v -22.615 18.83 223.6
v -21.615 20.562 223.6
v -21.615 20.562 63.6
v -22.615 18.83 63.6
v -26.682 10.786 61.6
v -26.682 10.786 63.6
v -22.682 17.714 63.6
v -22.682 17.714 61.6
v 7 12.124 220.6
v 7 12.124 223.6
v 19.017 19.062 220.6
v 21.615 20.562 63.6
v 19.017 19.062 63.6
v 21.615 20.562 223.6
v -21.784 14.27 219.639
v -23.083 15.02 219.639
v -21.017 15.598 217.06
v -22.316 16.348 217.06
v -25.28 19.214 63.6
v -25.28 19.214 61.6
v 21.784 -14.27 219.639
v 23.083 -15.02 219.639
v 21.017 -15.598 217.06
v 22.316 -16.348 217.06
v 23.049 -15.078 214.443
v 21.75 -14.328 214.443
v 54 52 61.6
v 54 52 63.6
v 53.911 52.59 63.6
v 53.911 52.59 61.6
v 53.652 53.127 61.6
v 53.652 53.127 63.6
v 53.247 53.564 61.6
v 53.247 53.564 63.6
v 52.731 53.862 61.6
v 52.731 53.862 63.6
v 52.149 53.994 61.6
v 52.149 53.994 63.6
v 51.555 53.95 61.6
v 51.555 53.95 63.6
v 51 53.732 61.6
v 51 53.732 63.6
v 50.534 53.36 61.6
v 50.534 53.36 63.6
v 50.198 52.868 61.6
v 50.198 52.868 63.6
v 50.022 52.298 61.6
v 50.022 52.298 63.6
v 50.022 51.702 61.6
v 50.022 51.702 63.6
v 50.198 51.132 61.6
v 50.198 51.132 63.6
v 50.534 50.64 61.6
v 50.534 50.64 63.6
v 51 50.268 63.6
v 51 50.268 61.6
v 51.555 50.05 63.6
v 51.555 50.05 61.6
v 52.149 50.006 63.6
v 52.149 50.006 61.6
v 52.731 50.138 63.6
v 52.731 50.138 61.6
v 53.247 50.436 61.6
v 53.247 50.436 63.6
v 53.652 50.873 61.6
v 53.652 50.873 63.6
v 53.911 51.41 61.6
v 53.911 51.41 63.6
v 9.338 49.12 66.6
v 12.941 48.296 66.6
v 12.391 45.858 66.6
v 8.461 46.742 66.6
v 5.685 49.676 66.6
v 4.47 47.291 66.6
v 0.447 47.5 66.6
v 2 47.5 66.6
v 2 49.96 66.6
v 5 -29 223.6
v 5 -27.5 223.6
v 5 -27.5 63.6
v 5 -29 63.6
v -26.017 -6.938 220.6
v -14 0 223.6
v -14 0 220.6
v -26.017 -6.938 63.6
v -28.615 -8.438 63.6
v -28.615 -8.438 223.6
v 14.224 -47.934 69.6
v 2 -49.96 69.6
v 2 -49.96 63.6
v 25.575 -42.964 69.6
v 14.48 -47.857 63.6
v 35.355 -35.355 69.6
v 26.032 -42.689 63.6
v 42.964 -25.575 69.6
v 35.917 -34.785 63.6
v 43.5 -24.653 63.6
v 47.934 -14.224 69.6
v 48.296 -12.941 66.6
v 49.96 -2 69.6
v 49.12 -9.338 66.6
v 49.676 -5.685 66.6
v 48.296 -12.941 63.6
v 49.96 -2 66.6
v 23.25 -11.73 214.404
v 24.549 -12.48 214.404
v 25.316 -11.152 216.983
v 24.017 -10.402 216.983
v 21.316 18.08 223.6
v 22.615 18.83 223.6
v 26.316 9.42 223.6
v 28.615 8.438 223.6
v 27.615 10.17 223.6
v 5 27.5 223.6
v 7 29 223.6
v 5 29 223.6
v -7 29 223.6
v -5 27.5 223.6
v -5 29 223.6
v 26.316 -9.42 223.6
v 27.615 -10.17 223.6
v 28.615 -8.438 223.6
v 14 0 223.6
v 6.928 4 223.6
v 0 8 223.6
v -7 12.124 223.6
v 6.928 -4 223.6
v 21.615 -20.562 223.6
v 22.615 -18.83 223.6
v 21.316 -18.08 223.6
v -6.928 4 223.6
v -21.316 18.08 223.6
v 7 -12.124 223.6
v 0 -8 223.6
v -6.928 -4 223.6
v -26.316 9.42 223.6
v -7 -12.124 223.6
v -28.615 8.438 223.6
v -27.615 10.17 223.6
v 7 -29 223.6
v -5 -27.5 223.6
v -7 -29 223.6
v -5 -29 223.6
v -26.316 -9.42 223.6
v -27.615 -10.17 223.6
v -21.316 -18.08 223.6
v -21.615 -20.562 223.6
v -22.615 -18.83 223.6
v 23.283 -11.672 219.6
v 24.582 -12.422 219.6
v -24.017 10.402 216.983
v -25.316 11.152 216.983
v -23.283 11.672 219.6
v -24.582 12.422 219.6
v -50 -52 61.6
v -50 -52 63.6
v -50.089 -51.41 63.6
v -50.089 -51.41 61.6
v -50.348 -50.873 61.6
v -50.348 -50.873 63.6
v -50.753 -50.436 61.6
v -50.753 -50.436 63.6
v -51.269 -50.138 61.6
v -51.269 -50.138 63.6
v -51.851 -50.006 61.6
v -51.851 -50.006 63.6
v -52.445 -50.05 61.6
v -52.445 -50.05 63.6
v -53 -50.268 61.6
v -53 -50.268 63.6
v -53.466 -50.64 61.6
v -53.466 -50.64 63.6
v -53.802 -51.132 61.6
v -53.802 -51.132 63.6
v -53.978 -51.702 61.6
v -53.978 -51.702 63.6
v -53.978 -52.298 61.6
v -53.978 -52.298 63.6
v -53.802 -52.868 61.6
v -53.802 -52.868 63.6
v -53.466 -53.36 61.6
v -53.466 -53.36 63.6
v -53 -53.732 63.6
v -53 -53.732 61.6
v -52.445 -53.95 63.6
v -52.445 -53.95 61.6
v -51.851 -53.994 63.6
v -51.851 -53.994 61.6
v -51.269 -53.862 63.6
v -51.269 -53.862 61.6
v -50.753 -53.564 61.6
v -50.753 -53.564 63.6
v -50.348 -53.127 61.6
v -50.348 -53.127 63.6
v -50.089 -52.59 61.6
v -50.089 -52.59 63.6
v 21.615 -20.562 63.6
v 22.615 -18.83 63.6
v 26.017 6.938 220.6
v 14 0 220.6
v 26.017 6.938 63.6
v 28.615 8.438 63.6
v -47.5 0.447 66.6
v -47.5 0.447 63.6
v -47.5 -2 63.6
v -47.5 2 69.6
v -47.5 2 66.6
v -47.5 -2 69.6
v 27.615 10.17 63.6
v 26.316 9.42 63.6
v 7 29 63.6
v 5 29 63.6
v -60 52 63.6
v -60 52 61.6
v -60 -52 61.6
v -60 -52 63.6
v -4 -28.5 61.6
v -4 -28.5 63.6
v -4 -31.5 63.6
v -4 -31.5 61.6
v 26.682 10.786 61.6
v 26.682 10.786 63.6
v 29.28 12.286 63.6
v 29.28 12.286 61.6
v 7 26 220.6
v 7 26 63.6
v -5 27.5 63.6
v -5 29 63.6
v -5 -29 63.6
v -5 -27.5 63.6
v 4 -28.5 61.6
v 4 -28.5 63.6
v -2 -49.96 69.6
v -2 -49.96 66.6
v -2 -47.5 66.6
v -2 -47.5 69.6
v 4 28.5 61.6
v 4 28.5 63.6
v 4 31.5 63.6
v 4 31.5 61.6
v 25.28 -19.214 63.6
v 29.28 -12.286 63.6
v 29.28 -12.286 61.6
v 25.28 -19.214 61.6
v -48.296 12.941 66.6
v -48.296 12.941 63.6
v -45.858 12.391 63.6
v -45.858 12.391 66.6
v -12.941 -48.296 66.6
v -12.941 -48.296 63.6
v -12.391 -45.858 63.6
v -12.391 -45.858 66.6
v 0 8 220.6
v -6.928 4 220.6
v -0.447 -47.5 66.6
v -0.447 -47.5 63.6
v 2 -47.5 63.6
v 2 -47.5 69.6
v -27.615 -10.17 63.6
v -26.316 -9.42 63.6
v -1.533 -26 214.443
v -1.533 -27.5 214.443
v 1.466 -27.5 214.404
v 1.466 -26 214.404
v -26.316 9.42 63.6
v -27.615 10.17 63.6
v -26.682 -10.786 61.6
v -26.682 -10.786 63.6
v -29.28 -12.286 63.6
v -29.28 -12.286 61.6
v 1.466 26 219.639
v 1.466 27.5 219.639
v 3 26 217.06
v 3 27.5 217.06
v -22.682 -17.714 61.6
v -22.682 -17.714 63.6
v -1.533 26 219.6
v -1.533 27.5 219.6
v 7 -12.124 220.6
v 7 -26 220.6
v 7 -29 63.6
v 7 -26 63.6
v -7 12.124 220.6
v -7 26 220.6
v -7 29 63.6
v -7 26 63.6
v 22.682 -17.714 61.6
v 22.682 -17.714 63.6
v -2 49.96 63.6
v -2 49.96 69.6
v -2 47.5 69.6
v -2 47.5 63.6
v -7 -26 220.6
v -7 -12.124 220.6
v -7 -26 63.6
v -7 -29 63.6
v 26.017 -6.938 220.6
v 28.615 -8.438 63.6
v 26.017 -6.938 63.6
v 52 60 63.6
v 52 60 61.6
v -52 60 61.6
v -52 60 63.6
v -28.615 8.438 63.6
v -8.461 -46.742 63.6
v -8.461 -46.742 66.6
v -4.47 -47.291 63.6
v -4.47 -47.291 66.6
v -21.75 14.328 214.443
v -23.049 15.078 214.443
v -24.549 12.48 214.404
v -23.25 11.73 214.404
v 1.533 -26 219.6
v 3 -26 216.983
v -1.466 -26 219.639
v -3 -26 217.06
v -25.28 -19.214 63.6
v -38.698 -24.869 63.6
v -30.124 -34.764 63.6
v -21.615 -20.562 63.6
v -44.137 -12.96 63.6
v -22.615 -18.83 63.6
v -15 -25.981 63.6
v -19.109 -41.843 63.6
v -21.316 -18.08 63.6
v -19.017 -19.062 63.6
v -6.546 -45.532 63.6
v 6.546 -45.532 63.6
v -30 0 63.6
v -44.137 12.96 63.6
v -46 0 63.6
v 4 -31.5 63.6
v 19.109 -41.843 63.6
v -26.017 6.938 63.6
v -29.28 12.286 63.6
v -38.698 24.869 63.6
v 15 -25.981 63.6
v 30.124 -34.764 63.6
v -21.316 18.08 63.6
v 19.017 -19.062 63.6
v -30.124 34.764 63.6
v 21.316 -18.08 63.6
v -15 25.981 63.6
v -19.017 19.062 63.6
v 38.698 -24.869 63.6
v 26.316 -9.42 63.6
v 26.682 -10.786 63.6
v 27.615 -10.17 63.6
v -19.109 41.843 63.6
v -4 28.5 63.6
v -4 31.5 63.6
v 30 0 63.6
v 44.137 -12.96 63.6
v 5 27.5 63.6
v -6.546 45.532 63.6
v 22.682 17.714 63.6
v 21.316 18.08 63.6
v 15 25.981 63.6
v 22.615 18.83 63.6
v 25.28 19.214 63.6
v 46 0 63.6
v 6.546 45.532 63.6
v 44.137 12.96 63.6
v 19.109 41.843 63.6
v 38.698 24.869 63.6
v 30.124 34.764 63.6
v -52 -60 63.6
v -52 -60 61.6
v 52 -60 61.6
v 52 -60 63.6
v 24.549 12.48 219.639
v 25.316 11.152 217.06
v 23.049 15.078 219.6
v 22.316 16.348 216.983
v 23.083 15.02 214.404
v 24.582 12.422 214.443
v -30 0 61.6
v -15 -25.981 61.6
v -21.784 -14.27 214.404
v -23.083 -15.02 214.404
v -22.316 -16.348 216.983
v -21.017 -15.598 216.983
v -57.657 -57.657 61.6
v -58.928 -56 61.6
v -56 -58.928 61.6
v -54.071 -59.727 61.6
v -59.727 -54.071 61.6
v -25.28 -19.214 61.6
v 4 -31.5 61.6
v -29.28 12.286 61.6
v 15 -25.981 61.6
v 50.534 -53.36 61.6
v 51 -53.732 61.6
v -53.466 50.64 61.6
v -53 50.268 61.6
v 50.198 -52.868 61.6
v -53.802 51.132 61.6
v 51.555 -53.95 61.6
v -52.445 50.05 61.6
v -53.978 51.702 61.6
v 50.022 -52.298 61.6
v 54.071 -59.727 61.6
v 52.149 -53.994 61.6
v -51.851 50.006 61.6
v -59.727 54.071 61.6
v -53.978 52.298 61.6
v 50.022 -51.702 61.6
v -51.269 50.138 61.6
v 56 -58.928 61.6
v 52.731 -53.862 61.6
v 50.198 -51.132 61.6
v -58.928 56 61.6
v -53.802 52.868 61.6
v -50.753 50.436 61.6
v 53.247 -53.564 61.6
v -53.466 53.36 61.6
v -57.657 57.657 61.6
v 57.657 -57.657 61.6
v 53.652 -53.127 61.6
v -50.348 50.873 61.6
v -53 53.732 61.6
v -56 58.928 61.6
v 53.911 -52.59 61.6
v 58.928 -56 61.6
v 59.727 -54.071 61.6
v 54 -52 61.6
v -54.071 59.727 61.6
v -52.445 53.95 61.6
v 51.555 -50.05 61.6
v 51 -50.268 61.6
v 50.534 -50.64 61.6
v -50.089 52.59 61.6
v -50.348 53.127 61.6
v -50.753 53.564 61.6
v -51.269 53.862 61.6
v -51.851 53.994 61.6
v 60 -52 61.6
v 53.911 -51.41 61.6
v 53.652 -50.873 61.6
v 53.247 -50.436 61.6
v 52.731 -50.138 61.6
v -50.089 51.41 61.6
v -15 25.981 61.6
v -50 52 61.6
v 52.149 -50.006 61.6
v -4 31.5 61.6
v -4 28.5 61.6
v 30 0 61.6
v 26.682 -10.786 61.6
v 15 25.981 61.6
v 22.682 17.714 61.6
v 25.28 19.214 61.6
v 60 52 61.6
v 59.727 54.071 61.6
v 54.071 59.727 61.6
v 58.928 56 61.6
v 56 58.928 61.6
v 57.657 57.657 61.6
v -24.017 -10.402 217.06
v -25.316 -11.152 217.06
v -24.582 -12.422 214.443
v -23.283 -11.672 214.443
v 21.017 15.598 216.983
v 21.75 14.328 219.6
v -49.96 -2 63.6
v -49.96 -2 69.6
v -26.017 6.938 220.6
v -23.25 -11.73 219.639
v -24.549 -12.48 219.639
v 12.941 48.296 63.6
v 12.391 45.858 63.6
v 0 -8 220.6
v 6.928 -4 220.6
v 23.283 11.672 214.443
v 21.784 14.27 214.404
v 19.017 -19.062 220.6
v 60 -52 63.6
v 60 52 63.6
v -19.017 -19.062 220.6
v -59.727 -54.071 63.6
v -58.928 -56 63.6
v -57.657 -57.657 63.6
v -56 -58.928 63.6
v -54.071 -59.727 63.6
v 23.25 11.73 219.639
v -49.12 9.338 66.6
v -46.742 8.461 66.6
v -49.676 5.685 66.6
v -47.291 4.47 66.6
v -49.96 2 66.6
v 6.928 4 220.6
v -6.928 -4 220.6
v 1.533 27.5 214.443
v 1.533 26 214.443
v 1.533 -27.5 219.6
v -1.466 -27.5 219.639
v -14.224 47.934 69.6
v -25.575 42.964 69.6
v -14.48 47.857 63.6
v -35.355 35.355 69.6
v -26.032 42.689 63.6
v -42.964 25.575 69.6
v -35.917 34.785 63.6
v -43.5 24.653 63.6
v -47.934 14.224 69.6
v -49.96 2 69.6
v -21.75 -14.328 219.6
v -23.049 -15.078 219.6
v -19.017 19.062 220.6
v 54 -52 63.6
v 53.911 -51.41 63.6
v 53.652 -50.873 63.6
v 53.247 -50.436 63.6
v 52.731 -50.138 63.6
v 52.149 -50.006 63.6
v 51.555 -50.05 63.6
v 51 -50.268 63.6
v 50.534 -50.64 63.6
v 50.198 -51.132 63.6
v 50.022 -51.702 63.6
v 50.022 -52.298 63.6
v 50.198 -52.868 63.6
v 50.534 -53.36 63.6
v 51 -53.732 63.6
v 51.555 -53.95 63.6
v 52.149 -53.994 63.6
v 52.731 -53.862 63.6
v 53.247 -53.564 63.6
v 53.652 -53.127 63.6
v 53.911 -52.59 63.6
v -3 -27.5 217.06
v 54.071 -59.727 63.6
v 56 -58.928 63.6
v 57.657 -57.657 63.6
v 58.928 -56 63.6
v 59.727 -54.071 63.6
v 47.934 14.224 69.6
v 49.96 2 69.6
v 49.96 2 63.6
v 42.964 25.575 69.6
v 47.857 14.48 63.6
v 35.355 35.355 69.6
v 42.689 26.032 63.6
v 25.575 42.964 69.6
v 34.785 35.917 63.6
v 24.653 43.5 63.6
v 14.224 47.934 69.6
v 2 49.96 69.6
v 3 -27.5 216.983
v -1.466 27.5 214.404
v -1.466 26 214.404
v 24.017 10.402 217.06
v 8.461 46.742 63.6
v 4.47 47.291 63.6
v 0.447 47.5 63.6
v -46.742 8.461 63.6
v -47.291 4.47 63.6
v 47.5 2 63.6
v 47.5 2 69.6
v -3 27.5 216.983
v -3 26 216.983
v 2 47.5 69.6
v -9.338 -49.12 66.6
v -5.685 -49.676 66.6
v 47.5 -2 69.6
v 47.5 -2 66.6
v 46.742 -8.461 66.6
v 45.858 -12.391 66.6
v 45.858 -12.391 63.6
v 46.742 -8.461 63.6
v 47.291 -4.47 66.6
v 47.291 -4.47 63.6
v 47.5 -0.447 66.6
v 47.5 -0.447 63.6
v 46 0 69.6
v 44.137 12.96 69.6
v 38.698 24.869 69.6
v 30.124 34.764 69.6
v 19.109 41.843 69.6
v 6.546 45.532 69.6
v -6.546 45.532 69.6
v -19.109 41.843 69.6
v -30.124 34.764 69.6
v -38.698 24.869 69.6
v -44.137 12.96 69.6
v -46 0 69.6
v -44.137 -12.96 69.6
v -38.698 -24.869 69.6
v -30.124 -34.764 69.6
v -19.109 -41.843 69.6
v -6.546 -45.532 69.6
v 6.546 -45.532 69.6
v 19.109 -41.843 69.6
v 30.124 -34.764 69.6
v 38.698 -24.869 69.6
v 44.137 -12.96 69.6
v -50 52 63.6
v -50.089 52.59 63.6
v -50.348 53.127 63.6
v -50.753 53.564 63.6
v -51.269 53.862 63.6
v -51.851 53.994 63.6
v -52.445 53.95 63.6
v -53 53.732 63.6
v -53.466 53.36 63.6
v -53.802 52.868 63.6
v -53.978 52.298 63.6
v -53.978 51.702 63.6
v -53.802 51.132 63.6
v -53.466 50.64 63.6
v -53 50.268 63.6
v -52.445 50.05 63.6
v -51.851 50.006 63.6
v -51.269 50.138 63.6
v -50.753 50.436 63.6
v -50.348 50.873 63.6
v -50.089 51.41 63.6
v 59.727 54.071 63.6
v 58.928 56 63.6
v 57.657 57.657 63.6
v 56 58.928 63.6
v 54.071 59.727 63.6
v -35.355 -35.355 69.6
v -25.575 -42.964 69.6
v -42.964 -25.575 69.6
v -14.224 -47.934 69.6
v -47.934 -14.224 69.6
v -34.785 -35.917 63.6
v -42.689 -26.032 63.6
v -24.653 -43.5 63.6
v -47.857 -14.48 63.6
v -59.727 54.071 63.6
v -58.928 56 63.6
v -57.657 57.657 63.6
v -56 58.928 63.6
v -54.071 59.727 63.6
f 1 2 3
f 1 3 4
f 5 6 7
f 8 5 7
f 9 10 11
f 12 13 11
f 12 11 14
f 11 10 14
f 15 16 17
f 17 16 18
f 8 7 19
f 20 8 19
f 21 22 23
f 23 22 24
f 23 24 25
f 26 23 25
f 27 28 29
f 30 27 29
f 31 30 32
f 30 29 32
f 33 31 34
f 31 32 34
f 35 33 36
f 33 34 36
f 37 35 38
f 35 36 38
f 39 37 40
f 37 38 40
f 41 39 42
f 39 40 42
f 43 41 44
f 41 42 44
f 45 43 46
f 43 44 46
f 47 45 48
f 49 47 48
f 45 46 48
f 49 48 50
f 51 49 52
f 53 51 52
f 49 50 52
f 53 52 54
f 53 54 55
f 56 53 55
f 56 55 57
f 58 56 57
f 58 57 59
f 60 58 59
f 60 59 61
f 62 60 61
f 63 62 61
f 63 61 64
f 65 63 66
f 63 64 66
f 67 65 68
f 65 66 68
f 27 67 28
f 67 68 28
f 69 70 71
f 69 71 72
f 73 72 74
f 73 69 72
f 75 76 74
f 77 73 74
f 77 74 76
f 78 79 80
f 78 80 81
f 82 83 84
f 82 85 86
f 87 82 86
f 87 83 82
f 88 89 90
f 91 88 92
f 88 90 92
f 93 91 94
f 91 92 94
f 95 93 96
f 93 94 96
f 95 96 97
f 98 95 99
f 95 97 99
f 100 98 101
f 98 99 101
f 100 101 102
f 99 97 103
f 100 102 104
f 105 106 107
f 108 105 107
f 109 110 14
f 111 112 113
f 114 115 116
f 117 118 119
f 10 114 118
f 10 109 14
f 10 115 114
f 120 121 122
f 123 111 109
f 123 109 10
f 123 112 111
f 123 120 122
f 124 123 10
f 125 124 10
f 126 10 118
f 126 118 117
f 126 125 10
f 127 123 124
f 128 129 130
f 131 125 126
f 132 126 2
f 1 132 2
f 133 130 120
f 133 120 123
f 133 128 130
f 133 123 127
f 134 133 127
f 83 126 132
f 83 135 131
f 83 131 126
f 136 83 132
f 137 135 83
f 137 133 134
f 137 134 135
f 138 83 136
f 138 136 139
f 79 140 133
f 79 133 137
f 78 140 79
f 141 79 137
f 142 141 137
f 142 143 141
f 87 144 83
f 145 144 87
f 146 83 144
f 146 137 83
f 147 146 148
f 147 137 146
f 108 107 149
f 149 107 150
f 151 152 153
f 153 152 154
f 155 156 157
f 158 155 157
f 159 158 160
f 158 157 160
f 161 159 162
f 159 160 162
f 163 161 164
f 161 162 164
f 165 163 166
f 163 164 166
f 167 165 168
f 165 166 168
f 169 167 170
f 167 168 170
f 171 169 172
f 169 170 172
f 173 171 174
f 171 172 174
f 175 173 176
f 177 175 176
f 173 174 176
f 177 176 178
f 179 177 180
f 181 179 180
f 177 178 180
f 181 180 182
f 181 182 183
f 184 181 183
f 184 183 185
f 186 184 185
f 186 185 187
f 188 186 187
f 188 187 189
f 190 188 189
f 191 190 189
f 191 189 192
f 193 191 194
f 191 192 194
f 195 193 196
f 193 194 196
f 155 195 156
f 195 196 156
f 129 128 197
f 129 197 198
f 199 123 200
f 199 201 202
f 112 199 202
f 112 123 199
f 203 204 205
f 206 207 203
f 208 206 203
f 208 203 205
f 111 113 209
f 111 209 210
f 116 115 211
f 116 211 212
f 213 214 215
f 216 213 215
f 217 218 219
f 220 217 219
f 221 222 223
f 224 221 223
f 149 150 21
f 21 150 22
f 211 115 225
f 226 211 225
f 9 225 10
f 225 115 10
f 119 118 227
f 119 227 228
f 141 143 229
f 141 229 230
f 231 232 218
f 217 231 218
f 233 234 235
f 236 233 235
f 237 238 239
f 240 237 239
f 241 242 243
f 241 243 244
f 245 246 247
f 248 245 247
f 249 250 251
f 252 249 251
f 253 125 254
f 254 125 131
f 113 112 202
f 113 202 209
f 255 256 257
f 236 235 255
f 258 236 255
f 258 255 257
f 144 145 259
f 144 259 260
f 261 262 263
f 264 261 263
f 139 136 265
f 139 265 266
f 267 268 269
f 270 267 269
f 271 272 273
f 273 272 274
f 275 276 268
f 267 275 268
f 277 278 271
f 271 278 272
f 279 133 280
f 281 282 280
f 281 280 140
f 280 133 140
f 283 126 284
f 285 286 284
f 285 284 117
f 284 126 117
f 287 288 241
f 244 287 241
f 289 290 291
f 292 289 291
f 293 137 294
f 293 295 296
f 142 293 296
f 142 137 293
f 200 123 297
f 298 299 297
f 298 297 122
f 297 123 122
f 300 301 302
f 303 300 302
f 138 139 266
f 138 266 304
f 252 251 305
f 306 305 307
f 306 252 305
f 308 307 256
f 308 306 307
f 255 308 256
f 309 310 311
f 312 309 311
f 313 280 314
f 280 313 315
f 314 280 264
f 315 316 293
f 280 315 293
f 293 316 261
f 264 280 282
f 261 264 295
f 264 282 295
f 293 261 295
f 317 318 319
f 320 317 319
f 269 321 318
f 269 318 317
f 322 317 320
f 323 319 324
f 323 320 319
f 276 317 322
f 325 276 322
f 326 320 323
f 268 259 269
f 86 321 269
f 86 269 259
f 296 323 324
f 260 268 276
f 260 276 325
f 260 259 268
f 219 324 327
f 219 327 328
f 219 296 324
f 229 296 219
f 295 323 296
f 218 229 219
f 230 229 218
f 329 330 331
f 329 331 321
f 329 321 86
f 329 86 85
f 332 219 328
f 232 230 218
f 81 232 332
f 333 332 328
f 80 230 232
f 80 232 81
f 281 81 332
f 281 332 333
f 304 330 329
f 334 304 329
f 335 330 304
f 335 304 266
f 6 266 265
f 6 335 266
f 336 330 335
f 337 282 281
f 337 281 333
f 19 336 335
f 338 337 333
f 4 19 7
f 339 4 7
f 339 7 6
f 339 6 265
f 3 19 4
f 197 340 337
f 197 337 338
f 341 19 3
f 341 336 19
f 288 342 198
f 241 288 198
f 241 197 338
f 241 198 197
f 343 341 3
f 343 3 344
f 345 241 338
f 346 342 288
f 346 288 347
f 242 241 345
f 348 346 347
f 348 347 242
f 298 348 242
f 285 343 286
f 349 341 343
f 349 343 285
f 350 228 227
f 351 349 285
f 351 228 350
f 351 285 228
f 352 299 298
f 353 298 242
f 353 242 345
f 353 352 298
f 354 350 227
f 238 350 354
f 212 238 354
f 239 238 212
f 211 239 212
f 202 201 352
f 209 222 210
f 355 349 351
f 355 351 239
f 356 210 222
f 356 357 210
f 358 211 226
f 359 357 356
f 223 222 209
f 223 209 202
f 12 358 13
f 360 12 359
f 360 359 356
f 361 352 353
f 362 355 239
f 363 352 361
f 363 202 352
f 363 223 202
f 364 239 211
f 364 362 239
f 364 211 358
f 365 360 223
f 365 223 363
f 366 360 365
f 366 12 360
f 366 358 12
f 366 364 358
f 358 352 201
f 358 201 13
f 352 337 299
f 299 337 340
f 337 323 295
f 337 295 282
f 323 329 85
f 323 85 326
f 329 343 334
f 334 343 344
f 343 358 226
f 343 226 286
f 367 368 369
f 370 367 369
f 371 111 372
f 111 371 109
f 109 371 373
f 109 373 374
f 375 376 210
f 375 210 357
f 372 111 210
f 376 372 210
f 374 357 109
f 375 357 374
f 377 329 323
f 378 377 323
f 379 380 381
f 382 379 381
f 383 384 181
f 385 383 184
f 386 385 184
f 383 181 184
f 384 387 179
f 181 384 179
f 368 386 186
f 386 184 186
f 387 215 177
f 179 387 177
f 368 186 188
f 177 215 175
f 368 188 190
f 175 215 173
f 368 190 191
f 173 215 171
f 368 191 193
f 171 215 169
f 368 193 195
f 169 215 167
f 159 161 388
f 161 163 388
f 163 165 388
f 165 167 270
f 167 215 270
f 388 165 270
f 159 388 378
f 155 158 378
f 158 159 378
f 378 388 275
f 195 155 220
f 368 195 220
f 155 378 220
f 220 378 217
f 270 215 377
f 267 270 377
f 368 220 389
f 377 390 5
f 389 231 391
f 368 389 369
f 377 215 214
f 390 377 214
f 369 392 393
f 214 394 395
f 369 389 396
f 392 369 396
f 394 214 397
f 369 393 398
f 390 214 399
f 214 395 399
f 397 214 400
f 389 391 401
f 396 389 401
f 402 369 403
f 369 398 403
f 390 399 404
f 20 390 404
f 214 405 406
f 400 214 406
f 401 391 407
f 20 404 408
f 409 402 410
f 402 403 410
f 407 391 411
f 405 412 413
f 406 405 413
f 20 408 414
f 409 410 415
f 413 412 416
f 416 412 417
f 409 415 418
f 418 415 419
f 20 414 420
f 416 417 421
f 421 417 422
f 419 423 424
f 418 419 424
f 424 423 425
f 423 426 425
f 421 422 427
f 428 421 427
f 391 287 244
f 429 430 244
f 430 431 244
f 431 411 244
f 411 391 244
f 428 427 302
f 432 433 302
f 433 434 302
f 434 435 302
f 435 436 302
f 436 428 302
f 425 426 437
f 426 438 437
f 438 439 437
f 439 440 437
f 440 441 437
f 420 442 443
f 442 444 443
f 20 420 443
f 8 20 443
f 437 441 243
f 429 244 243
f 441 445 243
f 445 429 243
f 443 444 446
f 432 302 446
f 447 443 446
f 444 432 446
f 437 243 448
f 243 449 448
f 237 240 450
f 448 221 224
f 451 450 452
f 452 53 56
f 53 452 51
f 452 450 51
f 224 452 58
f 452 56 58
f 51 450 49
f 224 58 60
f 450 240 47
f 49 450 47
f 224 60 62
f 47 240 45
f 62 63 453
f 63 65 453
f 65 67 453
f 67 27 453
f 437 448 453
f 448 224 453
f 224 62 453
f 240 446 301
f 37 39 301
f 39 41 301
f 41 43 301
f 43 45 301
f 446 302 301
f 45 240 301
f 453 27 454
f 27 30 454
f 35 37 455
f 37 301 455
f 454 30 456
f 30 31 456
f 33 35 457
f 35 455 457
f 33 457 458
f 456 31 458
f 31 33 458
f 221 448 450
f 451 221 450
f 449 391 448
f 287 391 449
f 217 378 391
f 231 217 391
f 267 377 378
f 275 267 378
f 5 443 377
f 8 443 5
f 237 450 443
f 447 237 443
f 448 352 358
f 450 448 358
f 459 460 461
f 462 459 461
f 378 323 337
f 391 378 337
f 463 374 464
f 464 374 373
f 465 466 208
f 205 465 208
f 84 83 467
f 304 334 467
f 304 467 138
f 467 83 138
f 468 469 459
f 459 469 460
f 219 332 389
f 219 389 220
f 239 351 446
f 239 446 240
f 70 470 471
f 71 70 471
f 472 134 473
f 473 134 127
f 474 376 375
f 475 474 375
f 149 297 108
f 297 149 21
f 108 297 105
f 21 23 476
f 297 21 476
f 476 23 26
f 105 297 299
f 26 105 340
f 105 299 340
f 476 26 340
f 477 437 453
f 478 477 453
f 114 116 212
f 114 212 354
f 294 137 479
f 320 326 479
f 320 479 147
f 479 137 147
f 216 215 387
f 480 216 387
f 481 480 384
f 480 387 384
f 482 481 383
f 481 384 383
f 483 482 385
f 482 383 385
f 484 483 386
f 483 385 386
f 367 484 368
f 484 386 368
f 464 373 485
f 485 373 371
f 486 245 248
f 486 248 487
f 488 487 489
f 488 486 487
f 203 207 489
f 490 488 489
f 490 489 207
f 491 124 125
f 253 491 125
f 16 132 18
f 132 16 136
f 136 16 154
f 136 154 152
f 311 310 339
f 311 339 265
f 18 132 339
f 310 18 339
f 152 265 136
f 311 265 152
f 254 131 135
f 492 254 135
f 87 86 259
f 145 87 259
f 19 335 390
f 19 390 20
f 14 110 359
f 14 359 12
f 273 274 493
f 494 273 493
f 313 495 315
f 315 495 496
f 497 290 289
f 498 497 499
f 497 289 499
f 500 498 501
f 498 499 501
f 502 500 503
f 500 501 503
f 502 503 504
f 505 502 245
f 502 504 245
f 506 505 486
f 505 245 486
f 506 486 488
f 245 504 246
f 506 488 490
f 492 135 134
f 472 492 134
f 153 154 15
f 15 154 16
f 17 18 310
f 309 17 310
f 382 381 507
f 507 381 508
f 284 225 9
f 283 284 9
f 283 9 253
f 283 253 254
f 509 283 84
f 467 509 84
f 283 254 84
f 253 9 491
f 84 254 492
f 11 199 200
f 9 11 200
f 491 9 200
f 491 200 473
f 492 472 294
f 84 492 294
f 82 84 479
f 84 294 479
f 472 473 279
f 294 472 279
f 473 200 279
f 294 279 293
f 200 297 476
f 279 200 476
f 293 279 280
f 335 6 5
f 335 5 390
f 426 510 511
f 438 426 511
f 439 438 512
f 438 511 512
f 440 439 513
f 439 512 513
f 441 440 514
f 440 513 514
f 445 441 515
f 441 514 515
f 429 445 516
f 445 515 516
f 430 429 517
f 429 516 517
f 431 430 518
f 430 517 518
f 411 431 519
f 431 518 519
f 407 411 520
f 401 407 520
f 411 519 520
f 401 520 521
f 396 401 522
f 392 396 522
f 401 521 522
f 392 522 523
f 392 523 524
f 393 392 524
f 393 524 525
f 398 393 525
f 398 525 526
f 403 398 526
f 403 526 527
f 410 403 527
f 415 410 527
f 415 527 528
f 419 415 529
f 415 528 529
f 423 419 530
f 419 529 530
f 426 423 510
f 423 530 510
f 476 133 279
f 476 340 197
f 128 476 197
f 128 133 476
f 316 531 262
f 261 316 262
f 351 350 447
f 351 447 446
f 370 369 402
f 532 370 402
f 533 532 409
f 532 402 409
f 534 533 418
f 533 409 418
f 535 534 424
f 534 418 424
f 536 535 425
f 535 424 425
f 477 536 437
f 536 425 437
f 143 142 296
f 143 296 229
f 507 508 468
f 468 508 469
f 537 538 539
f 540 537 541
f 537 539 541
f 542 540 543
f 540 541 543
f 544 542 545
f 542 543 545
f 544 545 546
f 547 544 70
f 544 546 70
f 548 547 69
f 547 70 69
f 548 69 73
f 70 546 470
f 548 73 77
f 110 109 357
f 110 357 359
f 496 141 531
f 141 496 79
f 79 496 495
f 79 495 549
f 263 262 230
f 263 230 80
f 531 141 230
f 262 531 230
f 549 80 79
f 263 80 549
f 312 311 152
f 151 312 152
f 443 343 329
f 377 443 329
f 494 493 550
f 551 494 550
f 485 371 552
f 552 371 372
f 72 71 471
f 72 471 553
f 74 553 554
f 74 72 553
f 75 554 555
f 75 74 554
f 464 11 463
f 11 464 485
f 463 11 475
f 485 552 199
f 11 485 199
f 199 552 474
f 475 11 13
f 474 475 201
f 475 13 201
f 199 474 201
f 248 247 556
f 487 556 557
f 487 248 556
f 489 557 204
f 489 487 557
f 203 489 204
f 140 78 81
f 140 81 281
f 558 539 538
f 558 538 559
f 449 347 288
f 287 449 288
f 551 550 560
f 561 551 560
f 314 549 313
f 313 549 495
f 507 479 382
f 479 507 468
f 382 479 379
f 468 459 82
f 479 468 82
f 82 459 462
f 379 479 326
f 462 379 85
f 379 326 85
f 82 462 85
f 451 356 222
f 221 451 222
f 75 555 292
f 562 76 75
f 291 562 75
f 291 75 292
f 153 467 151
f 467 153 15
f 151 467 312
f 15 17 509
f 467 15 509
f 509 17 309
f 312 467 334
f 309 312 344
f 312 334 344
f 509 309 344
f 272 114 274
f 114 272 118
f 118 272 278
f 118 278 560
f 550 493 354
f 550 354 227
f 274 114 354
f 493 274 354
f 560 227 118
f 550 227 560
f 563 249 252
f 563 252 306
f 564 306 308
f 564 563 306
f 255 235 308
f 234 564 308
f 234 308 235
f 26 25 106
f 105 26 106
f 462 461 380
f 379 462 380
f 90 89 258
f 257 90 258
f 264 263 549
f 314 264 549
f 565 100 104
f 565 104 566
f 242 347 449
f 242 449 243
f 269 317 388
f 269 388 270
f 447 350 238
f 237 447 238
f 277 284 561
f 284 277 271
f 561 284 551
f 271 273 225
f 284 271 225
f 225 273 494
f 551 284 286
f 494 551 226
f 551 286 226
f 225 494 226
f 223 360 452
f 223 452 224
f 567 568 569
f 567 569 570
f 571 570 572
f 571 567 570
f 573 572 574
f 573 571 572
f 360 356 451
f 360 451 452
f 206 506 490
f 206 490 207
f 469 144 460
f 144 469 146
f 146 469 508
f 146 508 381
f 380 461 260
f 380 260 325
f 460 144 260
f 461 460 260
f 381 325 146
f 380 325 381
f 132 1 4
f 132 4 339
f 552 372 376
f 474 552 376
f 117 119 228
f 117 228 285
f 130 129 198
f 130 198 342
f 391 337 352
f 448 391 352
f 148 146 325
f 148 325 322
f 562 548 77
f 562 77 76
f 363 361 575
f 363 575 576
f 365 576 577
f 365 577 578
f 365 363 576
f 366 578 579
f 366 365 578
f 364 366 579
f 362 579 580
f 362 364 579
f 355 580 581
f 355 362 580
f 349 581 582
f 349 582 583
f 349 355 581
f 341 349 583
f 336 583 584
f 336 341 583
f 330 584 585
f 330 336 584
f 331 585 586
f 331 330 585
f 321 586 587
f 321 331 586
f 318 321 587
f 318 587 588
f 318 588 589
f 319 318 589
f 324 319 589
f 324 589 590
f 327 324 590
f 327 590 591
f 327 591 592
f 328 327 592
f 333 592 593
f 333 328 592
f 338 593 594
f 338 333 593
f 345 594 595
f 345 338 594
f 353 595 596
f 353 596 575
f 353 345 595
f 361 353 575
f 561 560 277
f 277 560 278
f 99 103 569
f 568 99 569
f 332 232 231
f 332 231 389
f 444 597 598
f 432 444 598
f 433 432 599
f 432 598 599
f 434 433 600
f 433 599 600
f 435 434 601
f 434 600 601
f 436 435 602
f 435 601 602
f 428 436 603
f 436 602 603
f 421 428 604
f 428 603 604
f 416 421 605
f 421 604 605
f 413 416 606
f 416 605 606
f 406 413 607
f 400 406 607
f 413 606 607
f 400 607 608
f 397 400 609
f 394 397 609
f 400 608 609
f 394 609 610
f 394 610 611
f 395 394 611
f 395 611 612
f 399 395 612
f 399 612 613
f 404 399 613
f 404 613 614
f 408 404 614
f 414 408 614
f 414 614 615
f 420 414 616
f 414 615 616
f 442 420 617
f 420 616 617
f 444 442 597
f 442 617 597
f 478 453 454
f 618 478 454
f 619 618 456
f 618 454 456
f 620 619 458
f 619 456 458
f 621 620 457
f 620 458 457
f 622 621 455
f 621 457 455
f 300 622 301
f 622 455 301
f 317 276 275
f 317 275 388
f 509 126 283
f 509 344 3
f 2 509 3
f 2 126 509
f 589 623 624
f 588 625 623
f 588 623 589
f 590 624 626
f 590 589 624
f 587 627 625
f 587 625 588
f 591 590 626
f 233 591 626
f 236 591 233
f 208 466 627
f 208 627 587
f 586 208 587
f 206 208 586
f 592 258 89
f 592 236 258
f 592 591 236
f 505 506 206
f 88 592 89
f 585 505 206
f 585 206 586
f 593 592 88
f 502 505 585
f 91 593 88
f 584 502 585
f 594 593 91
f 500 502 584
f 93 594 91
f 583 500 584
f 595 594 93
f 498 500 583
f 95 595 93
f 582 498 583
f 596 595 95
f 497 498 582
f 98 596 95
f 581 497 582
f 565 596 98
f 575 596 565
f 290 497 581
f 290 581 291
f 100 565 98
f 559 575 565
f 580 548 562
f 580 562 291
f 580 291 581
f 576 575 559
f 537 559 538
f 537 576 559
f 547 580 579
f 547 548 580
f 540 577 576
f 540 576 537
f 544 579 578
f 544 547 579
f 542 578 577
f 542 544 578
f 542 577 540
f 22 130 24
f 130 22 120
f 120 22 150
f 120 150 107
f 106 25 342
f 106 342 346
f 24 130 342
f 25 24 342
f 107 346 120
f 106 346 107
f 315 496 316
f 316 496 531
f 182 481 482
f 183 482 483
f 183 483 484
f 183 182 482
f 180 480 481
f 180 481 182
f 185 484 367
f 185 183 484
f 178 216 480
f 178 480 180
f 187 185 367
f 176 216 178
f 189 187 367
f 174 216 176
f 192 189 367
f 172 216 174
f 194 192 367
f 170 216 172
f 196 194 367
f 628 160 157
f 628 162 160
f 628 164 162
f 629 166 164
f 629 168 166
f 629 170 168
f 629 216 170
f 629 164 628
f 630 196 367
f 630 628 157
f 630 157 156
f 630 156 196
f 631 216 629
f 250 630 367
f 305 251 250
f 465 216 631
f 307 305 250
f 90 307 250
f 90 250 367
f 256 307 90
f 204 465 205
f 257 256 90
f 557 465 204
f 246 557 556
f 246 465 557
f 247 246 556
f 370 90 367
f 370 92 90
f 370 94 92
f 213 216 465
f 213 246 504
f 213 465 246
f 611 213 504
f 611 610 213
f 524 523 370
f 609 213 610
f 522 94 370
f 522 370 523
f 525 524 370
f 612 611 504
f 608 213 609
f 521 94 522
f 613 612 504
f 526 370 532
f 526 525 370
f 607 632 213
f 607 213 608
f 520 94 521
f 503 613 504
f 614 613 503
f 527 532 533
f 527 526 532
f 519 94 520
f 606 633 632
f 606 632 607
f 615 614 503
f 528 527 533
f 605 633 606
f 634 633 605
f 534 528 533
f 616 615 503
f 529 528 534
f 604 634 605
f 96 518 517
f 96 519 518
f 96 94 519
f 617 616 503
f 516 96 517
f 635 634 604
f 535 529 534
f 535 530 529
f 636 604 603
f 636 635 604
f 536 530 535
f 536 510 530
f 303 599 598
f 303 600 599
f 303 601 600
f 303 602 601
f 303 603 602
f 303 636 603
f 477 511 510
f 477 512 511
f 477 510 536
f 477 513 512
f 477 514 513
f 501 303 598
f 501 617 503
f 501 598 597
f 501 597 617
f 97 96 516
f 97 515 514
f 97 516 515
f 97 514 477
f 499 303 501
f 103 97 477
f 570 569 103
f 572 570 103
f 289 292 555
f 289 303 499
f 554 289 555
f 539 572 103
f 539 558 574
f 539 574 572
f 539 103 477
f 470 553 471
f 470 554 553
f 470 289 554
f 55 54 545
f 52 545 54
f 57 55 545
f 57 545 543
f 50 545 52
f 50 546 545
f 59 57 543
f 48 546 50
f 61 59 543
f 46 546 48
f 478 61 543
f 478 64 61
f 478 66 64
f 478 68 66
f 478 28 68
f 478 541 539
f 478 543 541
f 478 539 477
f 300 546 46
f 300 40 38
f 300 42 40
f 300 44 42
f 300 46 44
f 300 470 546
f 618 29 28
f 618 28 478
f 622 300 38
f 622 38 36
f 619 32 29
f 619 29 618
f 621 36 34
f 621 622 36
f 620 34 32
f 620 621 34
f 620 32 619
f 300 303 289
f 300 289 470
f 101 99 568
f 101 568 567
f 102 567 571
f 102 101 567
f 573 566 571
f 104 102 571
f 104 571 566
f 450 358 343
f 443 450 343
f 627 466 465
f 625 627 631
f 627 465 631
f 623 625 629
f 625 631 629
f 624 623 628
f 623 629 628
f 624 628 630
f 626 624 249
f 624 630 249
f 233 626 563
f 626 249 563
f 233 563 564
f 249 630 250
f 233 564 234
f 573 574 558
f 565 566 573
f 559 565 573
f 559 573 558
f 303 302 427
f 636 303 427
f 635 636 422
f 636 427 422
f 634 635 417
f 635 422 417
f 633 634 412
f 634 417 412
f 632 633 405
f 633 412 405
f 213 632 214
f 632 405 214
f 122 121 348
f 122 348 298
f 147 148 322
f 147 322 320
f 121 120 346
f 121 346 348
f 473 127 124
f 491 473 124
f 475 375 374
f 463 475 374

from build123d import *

# Parameters (mm, degrees)
PAD009_DEPTH          = 2
SKETCH015_R           = 2
POCKET005_DEPTH       = 2
POCKET006_DEPTH       = 2
PAD010_DEPTH          = 160
POLARPATTERN001_COUNT = 6
SKETCH018_W           = 8
SKETCH018_H           = 3
POCKET007_DEPTH       = 2
POLARPATTERN002_COUNT = 6
SKETCH019_W           = 14
SKETCH019_H           = 27
PAD011_DEPTH          = 3
POLARPATTERN003_COUNT = 6
POCKET008_DEPTH       = 5
POLARPATTERN004_COUNT = 6
SKETCH021_R           = 50
SKETCH021_R_2         = 46
PAD012_DEPTH          = 6
SKETCH022_W           = 4
SKETCH022_H           = 3
POCKET009_DEPTH       = 6
POLARPATTERN005_COUNT = 4
SKETCH023_W           = 2.5
SKETCH023_H           = 3
POLARPATTERN006_COUNT = 4
POCKET010_DEPTH       = 5


with BuildPart() as part:
    # Sketch014 → Pad009 (new body)
    with BuildSketch(Plane.XY):
        with BuildLine():
            Line((-52, -60), (52, -60))
            ThreePointArc((52, -60), (57.6568542495, -57.6568542495), (60, -52))
            Line((60, -52), (60, 52))
            ThreePointArc((60, 52), (57.6568542495, 57.6568542495), (52, 60))
            Line((52, 60), (-52, 60))
            ThreePointArc((-52, 60), (-57.6568542495, 57.6568542495), (-60, 52))
            Line((-60, 52), (-60, -52))
            ThreePointArc((-60, -52), (-57.6568542495, -57.6568542495), (-52, -60))
        make_face()
    extrude(amount=PAD009_DEPTH)

    # Sketch015 (on Face10 of Pad009) → Pocket005 (cut)
    with BuildSketch(Plane.XY.offset(2)):
        with Locations((-52, 52)):
            Circle(SKETCH015_R)
        with Locations((52, 52)):
            Circle(SKETCH015_R)
        with Locations((52, -52)):
            Circle(SKETCH015_R)
        with Locations((-52, -52)):
            Circle(SKETCH015_R)
    extrude(amount=-POCKET005_DEPTH, mode=Mode.SUBTRACT)

    # Sketch016 (on Face5 of Pocket005) → Pocket006 (cut)
    with BuildSketch(Plane.XY.offset(2)):
        Polygon((30, 0), (15, 25.9807621135), (-15, 25.9807621135), (-30, 0), (-15, -25.9807621135), (15, -25.9807621135), align=None)
    extrude(amount=-POCKET006_DEPTH, mode=Mode.SUBTRACT)

    # Sketch017 (on Face5 of Pocket006) → Pad010 (join)
    with BuildSketch(Plane.XY.offset(2)):
        Polygon((-7, 26), (7, 26), (7, 29), (5, 29), (5, 27.5), (-5, 27.5), (-5, 29), (-7, 29), align=None)
    pad010 = extrude(amount=PAD010_DEPTH)

    # PolarPattern001: Pad010 ×6 about axis
    polarpattern001_axis = Axis((0, 0, 2), (0, 0, 1))
    for i in range(1, POLARPATTERN001_COUNT):
        add(pad010.rotate(polarpattern001_axis, i * 360 / POLARPATTERN001_COUNT))

    # Sketch018 (on Face5 of PolarPattern001) → Pocket007 (cut)
    with BuildSketch(Plane.XY.offset(2)):
        with Locations((0, 30)):
            Rectangle(SKETCH018_W, SKETCH018_H)
    pocket007 = extrude(amount=-POCKET007_DEPTH, mode=Mode.SUBTRACT)

    # PolarPattern002: Pocket007 ×6 about axis
    polarpattern002_axis = Axis((0, 0, 2), (0, 0, 1))
    for i in range(1, POLARPATTERN002_COUNT):
        add(pocket007.rotate(polarpattern002_axis, i * 360 / POLARPATTERN002_COUNT), mode=Mode.SUBTRACT)

    # Sketch019 (on Face98 of PolarPattern002) → Pad011 (join)
    with BuildSketch(Plane.XY.offset(162)):
        with Locations((0, 13.5)):
            Rectangle(SKETCH019_W, SKETCH019_H)
    pad011 = extrude(amount=-PAD011_DEPTH)

    # PolarPattern003: Pad011 ×6 about axis
    polarpattern003_axis = Axis((0, 0, 162), (0, 0, 1))
    for i in range(1, POLARPATTERN003_COUNT):
        add(pad011.rotate(polarpattern003_axis, i * 360 / POLARPATTERN003_COUNT))

    # Sketch020 (on Face71 of PolarPattern003) → Pocket008 (cut)
    with BuildSketch(Plane(origin=(23.8156986041, 13.75, 0), x_dir=(-0.5, 0.8660254038, 0), z_dir=(0.8660254038, 0.5, 0))):
        Polygon((2.9997494237, 155.3827539752), (1.5334536671, 158), (-1.4662957566, 158.0387736377), (-2.9997494237, 155.4603012506), (-1.5334536671, 152.8430552259), (1.4662957566, 152.8042815882), align=None)
    pocket008 = extrude(amount=-POCKET008_DEPTH, mode=Mode.SUBTRACT)

    # PolarPattern004: Pocket008 ×6 about axis
    polarpattern004_axis = Axis((0, 0, 0), (0, 0, 1))
    for i in range(1, POLARPATTERN004_COUNT):
        add(pocket008.rotate(polarpattern004_axis, i * 360 / POLARPATTERN004_COUNT), mode=Mode.SUBTRACT)

    # Sketch021 (on Face5 of PolarPattern004) → Pad012 (join)
    with BuildSketch(Plane.XY.offset(2)):
        Circle(SKETCH021_R)
        Circle(SKETCH021_R_2, mode=Mode.SUBTRACT)
    extrude(amount=PAD012_DEPTH)

    # Sketch022 (on Face47 of Pad012) → Pocket009 (cut)
    with BuildSketch(Plane.XY.offset(8)):
        with Locations((0, -49)):
            Rectangle(SKETCH022_W, SKETCH022_H)
    pocket009 = extrude(amount=-POCKET009_DEPTH, mode=Mode.SUBTRACT)

    # PolarPattern005: Pocket009 ×4 about axis
    polarpattern005_axis = Axis((0, 0, 8), (0, 0, 1))
    for i in range(1, POLARPATTERN005_COUNT):
        add(pocket009.rotate(polarpattern005_axis, i * 360 / POLARPATTERN005_COUNT), mode=Mode.SUBTRACT)

    # SubtractivePipe: sweep along a path in Sketch024
    with BuildLine(Plane.XY.offset(2)) as subtractivepipe_path:
        ThreePointArc((-12.940932525, -48.2962966011), (-6.5262994853, -49.5722444018), (0, -50))
    # Sketch023 (on DatumPlane) → SubtractivePipe (sweep, cut)
    with BuildSketch(Plane.YZ.offset(-2)):
        with Locations((-48.7099839872, 3.5)):
            Rectangle(SKETCH023_W, SKETCH023_H)
    subtractivepipe = sweep(path=subtractivepipe_path.line, mode=Mode.SUBTRACT)

    # PolarPattern006: SubtractivePipe ×4 about axis
    polarpattern006_axis = Axis((0, 0, 0), (0, 0, 1))
    for i in range(1, POLARPATTERN006_COUNT):
        add(subtractivepipe.rotate(polarpattern006_axis, i * 360 / POLARPATTERN006_COUNT), mode=Mode.SUBTRACT)

    # Sketch025 (on Face123 of PolarPattern006) → Pocket010 (cut)
    with BuildSketch(Plane.XY.offset(162)):
        Polygon((6.9282031151, 4.0000001994), (-2.303e-07, 8), (-6.9282033454, 3.9999998006), (-6.9282031151, -4.0000001994), (2.303e-07, -8), (6.9282033454, -3.9999998006), align=None)
    extrude(amount=-POCKET010_DEPTH, mode=Mode.SUBTRACT)


with BuildPart() as part_1:
    # Body002 placement: moved
    add(part.part.moved(Location((0, 0, 61.6))))


solid = part_1.part
